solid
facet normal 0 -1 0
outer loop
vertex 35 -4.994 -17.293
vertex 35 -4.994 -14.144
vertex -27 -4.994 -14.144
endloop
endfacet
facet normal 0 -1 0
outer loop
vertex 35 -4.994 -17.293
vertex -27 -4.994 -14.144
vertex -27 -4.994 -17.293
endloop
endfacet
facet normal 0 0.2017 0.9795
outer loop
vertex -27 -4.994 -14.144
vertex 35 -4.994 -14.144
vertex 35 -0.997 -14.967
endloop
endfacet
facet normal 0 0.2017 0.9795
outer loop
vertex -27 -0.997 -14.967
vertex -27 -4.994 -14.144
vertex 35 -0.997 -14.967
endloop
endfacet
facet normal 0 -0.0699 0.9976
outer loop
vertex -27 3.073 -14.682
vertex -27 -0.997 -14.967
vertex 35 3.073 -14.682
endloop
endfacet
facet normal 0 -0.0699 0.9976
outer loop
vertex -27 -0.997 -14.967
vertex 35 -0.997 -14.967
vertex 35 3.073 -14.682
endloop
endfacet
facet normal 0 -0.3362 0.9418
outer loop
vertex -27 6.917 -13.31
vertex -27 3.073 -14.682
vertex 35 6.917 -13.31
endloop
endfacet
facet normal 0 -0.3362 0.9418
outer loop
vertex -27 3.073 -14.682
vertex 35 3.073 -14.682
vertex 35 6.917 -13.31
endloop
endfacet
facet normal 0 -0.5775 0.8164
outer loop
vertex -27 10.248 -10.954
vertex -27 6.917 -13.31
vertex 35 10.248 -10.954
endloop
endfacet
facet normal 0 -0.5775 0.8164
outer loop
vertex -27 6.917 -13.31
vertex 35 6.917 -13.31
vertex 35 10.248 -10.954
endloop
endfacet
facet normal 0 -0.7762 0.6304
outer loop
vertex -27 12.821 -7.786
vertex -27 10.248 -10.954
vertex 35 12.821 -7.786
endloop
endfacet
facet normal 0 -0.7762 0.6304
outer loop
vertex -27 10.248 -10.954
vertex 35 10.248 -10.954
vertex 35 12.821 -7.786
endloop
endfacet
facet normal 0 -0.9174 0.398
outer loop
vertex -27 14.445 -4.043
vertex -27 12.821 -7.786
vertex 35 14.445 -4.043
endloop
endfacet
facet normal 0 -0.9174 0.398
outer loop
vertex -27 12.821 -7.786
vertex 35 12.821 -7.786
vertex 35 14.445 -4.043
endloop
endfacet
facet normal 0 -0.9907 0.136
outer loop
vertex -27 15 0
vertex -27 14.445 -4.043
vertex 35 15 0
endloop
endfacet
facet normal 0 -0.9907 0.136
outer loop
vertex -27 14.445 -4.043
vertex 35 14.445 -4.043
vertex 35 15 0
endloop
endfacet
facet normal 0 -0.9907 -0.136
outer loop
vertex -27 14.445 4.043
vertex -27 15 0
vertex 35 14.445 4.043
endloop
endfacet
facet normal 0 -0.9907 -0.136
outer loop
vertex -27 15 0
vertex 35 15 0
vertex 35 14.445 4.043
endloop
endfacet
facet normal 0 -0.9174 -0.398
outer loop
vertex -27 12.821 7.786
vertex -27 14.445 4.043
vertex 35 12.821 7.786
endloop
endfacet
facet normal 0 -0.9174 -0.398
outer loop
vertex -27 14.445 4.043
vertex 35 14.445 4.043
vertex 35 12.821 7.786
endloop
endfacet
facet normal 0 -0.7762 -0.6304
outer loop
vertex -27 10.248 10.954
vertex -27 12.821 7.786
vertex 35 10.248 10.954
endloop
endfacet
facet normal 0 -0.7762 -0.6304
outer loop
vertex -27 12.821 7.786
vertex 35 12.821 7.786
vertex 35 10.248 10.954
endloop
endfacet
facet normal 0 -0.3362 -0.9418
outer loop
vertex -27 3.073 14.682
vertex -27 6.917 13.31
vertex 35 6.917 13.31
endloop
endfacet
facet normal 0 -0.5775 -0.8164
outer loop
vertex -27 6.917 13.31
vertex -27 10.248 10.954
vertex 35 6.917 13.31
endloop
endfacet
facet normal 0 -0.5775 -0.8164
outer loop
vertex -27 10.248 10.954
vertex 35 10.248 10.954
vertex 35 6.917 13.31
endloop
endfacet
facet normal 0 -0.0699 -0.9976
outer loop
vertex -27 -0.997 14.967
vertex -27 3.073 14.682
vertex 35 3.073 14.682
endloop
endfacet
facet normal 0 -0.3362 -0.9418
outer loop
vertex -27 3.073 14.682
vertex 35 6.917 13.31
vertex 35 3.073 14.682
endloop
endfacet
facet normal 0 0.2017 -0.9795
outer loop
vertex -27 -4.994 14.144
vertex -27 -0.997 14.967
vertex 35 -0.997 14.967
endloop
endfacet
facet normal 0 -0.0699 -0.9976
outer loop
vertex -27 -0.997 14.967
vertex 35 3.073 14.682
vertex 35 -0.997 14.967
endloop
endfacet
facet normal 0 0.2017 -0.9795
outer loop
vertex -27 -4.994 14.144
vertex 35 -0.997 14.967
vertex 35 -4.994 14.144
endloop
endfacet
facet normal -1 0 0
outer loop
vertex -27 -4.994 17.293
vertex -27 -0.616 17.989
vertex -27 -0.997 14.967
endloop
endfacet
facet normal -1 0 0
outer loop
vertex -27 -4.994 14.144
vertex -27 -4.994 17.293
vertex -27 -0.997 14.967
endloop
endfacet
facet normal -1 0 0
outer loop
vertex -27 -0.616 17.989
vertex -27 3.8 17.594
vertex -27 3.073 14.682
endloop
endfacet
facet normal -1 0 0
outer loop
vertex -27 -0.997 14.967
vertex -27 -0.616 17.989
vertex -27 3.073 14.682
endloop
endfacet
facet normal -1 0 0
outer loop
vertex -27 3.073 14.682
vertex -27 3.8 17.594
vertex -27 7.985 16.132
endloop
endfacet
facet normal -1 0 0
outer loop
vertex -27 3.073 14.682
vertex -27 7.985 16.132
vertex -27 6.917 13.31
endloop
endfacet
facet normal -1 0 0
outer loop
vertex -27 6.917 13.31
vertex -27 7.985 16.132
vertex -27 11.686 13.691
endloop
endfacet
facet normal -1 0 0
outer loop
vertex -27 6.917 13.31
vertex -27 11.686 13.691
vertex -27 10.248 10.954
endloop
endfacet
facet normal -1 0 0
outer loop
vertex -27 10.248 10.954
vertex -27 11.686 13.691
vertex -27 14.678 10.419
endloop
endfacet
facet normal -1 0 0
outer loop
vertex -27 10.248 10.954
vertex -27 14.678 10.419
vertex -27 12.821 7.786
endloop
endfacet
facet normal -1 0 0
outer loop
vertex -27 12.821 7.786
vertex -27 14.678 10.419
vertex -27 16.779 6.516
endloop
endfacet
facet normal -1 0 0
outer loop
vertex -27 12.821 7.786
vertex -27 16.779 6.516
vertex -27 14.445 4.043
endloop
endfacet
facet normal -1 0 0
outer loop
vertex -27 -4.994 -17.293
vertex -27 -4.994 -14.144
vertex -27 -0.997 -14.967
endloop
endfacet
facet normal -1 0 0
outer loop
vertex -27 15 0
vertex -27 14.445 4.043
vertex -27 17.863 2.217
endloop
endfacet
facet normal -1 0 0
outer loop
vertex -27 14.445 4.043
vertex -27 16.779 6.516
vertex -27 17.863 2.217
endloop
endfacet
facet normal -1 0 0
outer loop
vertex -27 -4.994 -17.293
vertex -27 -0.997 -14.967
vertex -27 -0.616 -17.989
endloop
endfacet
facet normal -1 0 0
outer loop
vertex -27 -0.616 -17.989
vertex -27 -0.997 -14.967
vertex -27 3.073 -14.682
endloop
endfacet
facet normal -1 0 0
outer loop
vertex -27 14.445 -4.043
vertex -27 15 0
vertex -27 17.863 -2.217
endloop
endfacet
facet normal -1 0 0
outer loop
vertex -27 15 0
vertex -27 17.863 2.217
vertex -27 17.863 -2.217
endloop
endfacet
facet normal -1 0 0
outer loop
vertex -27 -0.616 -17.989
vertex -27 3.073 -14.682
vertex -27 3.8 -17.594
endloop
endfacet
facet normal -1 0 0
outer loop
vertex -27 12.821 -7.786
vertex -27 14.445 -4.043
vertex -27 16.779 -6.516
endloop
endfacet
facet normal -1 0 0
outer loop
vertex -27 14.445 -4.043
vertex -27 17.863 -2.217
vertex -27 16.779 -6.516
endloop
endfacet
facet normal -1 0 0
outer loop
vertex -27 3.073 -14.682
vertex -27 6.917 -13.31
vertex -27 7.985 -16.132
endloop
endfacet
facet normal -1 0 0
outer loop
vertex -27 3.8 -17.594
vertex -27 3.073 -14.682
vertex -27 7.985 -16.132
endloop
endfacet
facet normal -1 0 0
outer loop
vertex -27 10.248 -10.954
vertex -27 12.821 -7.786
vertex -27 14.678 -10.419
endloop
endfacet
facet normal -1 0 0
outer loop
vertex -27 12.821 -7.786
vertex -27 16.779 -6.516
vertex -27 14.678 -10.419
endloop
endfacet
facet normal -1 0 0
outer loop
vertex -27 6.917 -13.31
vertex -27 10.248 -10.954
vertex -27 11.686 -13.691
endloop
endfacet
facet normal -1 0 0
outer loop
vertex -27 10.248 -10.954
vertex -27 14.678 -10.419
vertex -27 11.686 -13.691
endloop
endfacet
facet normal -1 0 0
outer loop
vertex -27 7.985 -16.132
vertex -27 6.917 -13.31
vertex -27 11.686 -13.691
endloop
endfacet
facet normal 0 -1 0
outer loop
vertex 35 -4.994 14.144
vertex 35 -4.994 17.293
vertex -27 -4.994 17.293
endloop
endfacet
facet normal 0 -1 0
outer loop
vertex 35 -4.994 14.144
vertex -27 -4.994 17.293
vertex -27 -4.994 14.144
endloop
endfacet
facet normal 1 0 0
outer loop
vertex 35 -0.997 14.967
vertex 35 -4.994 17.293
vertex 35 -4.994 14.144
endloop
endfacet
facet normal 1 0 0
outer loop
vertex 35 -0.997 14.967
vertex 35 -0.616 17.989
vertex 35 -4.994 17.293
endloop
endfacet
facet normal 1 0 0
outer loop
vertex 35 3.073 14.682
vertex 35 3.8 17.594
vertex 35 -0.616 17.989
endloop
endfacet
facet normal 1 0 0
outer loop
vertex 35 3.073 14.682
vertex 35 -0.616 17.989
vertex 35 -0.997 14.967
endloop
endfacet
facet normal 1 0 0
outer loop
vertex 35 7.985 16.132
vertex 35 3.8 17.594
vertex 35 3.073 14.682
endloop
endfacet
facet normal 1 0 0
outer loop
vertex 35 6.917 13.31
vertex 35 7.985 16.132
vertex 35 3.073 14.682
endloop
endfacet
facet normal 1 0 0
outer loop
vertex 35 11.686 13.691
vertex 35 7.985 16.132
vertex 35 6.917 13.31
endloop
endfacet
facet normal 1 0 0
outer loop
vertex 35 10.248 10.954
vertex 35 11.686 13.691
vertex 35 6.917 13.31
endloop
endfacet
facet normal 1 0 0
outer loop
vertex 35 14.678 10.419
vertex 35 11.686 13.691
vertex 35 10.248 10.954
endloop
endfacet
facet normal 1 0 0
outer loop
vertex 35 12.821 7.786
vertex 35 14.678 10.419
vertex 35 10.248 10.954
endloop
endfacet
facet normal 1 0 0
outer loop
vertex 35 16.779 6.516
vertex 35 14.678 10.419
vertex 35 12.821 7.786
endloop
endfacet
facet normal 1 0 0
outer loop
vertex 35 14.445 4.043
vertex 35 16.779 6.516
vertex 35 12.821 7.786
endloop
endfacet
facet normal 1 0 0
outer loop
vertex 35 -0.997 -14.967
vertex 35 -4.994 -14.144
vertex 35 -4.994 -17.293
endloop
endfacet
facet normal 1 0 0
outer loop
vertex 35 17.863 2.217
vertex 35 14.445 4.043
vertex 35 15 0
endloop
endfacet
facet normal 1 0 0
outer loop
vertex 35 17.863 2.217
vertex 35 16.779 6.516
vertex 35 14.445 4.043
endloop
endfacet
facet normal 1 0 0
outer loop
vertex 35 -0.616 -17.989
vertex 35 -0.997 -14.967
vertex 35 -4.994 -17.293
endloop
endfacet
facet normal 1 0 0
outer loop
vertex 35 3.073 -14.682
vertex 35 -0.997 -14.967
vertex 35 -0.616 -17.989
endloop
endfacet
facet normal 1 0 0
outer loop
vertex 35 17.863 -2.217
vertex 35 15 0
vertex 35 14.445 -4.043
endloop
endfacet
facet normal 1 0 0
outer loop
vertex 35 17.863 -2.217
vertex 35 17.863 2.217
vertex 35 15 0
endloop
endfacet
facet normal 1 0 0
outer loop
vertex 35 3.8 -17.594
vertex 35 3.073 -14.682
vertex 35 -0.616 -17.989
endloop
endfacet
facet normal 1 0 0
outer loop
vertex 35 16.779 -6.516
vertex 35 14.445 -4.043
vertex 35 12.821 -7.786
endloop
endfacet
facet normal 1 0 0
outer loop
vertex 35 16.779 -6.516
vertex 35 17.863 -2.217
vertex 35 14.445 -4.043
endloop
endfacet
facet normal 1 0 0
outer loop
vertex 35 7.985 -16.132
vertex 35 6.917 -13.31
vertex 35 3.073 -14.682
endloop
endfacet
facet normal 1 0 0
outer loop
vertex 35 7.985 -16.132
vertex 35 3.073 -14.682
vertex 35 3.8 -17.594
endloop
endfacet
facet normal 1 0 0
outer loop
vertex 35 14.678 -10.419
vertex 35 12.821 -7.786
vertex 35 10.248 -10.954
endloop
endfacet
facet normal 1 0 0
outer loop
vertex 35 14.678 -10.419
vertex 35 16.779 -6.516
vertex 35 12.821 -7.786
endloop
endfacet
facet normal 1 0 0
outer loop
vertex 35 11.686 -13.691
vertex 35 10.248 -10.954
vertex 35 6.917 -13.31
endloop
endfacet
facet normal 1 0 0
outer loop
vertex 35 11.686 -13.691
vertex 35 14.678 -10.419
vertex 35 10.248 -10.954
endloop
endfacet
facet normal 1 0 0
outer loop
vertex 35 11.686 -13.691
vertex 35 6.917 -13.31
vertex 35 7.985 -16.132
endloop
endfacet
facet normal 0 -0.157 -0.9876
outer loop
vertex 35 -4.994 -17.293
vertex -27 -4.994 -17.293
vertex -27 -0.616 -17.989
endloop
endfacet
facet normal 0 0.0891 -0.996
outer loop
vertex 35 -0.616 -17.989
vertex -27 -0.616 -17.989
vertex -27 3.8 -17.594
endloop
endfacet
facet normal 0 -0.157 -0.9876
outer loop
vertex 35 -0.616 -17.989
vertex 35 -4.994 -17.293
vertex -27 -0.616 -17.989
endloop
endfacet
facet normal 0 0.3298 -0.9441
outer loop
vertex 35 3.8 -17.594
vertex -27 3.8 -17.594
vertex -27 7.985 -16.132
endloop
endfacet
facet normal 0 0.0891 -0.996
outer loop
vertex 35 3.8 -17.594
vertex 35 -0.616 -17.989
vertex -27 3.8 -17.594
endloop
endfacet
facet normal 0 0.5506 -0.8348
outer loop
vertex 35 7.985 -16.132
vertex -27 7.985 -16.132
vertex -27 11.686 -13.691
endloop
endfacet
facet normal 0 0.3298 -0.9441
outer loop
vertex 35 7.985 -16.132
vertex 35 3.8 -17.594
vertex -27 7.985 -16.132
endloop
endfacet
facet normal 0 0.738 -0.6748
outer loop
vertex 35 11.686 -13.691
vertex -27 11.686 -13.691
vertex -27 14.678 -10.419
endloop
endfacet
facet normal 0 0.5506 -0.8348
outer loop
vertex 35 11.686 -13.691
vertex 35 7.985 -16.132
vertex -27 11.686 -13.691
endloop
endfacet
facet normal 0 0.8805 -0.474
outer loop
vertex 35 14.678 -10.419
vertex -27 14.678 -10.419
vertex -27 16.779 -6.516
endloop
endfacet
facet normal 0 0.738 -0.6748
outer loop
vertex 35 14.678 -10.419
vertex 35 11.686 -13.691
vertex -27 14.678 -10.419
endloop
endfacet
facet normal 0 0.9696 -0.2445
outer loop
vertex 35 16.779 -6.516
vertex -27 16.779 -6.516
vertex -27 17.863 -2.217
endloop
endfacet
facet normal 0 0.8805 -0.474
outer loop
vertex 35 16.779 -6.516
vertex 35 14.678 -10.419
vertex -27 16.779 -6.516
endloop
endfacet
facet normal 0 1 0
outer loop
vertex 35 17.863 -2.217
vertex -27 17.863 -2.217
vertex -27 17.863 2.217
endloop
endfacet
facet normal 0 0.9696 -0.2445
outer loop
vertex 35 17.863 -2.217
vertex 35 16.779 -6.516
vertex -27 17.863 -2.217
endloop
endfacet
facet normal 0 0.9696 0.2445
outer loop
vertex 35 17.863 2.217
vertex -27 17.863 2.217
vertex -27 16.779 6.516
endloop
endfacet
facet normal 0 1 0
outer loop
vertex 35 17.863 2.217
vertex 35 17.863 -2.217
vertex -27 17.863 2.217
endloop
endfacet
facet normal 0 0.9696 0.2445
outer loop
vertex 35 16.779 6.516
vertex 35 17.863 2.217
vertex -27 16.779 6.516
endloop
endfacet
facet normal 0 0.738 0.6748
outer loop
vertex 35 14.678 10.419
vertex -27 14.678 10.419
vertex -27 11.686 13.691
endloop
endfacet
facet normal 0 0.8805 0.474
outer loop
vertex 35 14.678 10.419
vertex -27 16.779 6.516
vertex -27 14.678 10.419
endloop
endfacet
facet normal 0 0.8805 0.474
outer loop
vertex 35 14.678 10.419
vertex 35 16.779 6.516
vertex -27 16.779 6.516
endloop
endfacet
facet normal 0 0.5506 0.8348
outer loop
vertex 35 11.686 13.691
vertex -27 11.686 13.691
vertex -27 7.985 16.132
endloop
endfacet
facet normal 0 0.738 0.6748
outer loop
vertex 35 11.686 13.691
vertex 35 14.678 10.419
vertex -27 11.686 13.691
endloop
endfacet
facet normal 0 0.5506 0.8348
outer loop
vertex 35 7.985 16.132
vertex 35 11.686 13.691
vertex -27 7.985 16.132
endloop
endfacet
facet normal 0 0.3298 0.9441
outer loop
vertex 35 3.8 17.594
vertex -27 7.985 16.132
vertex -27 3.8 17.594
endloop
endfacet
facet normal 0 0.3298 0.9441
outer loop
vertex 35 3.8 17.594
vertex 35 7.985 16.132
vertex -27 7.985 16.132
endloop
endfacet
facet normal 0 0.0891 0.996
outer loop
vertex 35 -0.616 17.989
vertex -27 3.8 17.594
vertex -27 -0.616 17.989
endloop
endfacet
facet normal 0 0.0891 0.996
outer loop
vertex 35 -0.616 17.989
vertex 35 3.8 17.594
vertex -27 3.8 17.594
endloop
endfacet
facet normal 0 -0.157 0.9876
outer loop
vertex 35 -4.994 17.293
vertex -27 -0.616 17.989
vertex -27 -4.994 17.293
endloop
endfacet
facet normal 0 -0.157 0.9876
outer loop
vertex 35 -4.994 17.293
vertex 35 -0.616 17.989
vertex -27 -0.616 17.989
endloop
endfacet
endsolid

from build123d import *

# Parameters (mm, degrees)
ESBO_O2_R                = 15
RESSALTO_EXTRUS_O1_DEPTH = 62
CASCA1_T                 = 3
CORTE_EXTRUS_O2_DEPTH    = 68.02238432


with BuildPart() as part:
    # Esboço2 → Ressalto-extrusão1 (new body)
    with BuildSketch(Plane(origin=(35, 0, 0), x_dir=(0, 0, -1), z_dir=(1, 0, 0))):
        Circle(ESBO_O2_R)
    extrude(amount=-RESSALTO_EXTRUS_O1_DEPTH)

    # Casca1
    casca1_openings = [part.faces().sort_by_distance(p)[0] for p in [
        (35, 0, 0),
        (-27, 0, 0),
    ]]
    offset(amount=CASCA1_T, openings=casca1_openings, kind=Kind.INTERSECTION)

    # Esboço3 → Corte-extrusão2 (cut, through all)
    with BuildSketch(Plane(origin=(35, 0, 0), x_dir=(0, 0, -1), z_dir=(1, 0, 0))):
        with BuildLine():
            Line((-17.2933099, -4.994139836), (17.2933099, -4.994139836))
            ThreePointArc((17.2933099, -4.994139836), (0, -18), (-17.2933099, -4.994139836))
        make_face()
    extrude(amount=-CORTE_EXTRUS_O2_DEPTH, mode=Mode.SUBTRACT)


solid = part.part
